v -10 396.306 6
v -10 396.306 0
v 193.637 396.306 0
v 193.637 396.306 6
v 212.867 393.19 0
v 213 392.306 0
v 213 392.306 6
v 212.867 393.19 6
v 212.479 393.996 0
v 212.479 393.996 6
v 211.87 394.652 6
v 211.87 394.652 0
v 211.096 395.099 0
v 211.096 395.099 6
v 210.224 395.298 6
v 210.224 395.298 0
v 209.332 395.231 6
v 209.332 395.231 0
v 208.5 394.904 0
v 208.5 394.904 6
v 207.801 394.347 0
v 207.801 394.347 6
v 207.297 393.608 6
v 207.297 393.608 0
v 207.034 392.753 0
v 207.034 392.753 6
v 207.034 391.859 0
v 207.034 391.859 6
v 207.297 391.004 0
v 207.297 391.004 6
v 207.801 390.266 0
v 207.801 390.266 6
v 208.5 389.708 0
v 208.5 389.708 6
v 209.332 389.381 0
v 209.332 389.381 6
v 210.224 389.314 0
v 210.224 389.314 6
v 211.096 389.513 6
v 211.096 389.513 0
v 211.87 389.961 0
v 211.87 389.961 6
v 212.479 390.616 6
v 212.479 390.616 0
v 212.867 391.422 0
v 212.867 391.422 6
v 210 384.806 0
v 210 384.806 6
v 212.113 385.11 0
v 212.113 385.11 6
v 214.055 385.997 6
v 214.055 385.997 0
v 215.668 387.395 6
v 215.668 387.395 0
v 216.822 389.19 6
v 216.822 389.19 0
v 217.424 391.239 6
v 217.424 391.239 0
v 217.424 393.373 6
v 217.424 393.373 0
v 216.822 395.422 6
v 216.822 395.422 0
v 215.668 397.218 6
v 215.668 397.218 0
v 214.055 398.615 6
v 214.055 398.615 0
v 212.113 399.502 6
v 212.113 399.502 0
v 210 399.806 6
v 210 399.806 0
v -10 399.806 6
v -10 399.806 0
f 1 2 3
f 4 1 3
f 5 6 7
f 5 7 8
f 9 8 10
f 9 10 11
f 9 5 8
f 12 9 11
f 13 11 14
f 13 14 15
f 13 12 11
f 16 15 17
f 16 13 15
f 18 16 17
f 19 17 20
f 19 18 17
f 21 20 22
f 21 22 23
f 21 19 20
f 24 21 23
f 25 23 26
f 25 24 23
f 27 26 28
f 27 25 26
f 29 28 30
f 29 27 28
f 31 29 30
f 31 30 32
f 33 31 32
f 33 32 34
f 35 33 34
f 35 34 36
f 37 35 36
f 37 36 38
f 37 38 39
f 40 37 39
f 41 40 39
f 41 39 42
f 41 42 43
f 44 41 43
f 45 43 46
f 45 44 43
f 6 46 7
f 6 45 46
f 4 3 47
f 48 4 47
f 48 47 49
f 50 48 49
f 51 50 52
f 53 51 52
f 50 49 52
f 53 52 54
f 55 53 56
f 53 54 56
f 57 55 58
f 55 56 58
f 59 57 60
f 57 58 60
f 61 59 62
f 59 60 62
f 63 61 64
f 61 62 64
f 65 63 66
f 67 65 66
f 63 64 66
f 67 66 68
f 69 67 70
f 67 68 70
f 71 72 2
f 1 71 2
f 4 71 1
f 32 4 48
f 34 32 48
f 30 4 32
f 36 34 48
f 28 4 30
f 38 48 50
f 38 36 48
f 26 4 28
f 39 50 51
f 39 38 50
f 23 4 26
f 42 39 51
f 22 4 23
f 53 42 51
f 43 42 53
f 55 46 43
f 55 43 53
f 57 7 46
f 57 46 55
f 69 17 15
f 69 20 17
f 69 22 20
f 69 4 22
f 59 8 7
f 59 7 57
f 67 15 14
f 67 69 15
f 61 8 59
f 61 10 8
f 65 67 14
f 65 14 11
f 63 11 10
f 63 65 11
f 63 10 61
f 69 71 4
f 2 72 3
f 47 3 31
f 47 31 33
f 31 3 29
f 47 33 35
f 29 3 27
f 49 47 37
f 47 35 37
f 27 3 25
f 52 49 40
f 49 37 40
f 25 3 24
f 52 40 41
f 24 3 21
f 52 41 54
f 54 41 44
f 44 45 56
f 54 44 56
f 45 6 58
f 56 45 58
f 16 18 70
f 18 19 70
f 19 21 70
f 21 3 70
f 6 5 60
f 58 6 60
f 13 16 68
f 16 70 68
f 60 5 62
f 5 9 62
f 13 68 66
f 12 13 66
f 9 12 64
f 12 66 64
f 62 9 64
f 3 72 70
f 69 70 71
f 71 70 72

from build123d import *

# Parameters (mm, degrees)
SKETCH1_R           = 3
BOSS_EXTRUDE1_DEPTH = 6


with BuildPart() as part:
    # Sketch1 → Boss-Extrude1 (new body)
    with BuildSketch(Plane.XY):
        with BuildLine():
            Line((210, 399.806072497), (-10, 399.806072497))
            Line((-10, 399.806072497), (-10, 396.306072497))
            Line((-10, 396.306072497), (193.636931828, 396.306072497))
            Line((193.636931828, 396.306072497), (210, 384.806072497))
            ThreePointArc((210, 384.806072497), (217.5, 392.306072497), (210, 399.806072497))
        make_face()
        with Locations((210, 392.306072497)):
            Circle(SKETCH1_R, mode=Mode.SUBTRACT)
    extrude(amount=BOSS_EXTRUDE1_DEPTH)


solid = part.part
